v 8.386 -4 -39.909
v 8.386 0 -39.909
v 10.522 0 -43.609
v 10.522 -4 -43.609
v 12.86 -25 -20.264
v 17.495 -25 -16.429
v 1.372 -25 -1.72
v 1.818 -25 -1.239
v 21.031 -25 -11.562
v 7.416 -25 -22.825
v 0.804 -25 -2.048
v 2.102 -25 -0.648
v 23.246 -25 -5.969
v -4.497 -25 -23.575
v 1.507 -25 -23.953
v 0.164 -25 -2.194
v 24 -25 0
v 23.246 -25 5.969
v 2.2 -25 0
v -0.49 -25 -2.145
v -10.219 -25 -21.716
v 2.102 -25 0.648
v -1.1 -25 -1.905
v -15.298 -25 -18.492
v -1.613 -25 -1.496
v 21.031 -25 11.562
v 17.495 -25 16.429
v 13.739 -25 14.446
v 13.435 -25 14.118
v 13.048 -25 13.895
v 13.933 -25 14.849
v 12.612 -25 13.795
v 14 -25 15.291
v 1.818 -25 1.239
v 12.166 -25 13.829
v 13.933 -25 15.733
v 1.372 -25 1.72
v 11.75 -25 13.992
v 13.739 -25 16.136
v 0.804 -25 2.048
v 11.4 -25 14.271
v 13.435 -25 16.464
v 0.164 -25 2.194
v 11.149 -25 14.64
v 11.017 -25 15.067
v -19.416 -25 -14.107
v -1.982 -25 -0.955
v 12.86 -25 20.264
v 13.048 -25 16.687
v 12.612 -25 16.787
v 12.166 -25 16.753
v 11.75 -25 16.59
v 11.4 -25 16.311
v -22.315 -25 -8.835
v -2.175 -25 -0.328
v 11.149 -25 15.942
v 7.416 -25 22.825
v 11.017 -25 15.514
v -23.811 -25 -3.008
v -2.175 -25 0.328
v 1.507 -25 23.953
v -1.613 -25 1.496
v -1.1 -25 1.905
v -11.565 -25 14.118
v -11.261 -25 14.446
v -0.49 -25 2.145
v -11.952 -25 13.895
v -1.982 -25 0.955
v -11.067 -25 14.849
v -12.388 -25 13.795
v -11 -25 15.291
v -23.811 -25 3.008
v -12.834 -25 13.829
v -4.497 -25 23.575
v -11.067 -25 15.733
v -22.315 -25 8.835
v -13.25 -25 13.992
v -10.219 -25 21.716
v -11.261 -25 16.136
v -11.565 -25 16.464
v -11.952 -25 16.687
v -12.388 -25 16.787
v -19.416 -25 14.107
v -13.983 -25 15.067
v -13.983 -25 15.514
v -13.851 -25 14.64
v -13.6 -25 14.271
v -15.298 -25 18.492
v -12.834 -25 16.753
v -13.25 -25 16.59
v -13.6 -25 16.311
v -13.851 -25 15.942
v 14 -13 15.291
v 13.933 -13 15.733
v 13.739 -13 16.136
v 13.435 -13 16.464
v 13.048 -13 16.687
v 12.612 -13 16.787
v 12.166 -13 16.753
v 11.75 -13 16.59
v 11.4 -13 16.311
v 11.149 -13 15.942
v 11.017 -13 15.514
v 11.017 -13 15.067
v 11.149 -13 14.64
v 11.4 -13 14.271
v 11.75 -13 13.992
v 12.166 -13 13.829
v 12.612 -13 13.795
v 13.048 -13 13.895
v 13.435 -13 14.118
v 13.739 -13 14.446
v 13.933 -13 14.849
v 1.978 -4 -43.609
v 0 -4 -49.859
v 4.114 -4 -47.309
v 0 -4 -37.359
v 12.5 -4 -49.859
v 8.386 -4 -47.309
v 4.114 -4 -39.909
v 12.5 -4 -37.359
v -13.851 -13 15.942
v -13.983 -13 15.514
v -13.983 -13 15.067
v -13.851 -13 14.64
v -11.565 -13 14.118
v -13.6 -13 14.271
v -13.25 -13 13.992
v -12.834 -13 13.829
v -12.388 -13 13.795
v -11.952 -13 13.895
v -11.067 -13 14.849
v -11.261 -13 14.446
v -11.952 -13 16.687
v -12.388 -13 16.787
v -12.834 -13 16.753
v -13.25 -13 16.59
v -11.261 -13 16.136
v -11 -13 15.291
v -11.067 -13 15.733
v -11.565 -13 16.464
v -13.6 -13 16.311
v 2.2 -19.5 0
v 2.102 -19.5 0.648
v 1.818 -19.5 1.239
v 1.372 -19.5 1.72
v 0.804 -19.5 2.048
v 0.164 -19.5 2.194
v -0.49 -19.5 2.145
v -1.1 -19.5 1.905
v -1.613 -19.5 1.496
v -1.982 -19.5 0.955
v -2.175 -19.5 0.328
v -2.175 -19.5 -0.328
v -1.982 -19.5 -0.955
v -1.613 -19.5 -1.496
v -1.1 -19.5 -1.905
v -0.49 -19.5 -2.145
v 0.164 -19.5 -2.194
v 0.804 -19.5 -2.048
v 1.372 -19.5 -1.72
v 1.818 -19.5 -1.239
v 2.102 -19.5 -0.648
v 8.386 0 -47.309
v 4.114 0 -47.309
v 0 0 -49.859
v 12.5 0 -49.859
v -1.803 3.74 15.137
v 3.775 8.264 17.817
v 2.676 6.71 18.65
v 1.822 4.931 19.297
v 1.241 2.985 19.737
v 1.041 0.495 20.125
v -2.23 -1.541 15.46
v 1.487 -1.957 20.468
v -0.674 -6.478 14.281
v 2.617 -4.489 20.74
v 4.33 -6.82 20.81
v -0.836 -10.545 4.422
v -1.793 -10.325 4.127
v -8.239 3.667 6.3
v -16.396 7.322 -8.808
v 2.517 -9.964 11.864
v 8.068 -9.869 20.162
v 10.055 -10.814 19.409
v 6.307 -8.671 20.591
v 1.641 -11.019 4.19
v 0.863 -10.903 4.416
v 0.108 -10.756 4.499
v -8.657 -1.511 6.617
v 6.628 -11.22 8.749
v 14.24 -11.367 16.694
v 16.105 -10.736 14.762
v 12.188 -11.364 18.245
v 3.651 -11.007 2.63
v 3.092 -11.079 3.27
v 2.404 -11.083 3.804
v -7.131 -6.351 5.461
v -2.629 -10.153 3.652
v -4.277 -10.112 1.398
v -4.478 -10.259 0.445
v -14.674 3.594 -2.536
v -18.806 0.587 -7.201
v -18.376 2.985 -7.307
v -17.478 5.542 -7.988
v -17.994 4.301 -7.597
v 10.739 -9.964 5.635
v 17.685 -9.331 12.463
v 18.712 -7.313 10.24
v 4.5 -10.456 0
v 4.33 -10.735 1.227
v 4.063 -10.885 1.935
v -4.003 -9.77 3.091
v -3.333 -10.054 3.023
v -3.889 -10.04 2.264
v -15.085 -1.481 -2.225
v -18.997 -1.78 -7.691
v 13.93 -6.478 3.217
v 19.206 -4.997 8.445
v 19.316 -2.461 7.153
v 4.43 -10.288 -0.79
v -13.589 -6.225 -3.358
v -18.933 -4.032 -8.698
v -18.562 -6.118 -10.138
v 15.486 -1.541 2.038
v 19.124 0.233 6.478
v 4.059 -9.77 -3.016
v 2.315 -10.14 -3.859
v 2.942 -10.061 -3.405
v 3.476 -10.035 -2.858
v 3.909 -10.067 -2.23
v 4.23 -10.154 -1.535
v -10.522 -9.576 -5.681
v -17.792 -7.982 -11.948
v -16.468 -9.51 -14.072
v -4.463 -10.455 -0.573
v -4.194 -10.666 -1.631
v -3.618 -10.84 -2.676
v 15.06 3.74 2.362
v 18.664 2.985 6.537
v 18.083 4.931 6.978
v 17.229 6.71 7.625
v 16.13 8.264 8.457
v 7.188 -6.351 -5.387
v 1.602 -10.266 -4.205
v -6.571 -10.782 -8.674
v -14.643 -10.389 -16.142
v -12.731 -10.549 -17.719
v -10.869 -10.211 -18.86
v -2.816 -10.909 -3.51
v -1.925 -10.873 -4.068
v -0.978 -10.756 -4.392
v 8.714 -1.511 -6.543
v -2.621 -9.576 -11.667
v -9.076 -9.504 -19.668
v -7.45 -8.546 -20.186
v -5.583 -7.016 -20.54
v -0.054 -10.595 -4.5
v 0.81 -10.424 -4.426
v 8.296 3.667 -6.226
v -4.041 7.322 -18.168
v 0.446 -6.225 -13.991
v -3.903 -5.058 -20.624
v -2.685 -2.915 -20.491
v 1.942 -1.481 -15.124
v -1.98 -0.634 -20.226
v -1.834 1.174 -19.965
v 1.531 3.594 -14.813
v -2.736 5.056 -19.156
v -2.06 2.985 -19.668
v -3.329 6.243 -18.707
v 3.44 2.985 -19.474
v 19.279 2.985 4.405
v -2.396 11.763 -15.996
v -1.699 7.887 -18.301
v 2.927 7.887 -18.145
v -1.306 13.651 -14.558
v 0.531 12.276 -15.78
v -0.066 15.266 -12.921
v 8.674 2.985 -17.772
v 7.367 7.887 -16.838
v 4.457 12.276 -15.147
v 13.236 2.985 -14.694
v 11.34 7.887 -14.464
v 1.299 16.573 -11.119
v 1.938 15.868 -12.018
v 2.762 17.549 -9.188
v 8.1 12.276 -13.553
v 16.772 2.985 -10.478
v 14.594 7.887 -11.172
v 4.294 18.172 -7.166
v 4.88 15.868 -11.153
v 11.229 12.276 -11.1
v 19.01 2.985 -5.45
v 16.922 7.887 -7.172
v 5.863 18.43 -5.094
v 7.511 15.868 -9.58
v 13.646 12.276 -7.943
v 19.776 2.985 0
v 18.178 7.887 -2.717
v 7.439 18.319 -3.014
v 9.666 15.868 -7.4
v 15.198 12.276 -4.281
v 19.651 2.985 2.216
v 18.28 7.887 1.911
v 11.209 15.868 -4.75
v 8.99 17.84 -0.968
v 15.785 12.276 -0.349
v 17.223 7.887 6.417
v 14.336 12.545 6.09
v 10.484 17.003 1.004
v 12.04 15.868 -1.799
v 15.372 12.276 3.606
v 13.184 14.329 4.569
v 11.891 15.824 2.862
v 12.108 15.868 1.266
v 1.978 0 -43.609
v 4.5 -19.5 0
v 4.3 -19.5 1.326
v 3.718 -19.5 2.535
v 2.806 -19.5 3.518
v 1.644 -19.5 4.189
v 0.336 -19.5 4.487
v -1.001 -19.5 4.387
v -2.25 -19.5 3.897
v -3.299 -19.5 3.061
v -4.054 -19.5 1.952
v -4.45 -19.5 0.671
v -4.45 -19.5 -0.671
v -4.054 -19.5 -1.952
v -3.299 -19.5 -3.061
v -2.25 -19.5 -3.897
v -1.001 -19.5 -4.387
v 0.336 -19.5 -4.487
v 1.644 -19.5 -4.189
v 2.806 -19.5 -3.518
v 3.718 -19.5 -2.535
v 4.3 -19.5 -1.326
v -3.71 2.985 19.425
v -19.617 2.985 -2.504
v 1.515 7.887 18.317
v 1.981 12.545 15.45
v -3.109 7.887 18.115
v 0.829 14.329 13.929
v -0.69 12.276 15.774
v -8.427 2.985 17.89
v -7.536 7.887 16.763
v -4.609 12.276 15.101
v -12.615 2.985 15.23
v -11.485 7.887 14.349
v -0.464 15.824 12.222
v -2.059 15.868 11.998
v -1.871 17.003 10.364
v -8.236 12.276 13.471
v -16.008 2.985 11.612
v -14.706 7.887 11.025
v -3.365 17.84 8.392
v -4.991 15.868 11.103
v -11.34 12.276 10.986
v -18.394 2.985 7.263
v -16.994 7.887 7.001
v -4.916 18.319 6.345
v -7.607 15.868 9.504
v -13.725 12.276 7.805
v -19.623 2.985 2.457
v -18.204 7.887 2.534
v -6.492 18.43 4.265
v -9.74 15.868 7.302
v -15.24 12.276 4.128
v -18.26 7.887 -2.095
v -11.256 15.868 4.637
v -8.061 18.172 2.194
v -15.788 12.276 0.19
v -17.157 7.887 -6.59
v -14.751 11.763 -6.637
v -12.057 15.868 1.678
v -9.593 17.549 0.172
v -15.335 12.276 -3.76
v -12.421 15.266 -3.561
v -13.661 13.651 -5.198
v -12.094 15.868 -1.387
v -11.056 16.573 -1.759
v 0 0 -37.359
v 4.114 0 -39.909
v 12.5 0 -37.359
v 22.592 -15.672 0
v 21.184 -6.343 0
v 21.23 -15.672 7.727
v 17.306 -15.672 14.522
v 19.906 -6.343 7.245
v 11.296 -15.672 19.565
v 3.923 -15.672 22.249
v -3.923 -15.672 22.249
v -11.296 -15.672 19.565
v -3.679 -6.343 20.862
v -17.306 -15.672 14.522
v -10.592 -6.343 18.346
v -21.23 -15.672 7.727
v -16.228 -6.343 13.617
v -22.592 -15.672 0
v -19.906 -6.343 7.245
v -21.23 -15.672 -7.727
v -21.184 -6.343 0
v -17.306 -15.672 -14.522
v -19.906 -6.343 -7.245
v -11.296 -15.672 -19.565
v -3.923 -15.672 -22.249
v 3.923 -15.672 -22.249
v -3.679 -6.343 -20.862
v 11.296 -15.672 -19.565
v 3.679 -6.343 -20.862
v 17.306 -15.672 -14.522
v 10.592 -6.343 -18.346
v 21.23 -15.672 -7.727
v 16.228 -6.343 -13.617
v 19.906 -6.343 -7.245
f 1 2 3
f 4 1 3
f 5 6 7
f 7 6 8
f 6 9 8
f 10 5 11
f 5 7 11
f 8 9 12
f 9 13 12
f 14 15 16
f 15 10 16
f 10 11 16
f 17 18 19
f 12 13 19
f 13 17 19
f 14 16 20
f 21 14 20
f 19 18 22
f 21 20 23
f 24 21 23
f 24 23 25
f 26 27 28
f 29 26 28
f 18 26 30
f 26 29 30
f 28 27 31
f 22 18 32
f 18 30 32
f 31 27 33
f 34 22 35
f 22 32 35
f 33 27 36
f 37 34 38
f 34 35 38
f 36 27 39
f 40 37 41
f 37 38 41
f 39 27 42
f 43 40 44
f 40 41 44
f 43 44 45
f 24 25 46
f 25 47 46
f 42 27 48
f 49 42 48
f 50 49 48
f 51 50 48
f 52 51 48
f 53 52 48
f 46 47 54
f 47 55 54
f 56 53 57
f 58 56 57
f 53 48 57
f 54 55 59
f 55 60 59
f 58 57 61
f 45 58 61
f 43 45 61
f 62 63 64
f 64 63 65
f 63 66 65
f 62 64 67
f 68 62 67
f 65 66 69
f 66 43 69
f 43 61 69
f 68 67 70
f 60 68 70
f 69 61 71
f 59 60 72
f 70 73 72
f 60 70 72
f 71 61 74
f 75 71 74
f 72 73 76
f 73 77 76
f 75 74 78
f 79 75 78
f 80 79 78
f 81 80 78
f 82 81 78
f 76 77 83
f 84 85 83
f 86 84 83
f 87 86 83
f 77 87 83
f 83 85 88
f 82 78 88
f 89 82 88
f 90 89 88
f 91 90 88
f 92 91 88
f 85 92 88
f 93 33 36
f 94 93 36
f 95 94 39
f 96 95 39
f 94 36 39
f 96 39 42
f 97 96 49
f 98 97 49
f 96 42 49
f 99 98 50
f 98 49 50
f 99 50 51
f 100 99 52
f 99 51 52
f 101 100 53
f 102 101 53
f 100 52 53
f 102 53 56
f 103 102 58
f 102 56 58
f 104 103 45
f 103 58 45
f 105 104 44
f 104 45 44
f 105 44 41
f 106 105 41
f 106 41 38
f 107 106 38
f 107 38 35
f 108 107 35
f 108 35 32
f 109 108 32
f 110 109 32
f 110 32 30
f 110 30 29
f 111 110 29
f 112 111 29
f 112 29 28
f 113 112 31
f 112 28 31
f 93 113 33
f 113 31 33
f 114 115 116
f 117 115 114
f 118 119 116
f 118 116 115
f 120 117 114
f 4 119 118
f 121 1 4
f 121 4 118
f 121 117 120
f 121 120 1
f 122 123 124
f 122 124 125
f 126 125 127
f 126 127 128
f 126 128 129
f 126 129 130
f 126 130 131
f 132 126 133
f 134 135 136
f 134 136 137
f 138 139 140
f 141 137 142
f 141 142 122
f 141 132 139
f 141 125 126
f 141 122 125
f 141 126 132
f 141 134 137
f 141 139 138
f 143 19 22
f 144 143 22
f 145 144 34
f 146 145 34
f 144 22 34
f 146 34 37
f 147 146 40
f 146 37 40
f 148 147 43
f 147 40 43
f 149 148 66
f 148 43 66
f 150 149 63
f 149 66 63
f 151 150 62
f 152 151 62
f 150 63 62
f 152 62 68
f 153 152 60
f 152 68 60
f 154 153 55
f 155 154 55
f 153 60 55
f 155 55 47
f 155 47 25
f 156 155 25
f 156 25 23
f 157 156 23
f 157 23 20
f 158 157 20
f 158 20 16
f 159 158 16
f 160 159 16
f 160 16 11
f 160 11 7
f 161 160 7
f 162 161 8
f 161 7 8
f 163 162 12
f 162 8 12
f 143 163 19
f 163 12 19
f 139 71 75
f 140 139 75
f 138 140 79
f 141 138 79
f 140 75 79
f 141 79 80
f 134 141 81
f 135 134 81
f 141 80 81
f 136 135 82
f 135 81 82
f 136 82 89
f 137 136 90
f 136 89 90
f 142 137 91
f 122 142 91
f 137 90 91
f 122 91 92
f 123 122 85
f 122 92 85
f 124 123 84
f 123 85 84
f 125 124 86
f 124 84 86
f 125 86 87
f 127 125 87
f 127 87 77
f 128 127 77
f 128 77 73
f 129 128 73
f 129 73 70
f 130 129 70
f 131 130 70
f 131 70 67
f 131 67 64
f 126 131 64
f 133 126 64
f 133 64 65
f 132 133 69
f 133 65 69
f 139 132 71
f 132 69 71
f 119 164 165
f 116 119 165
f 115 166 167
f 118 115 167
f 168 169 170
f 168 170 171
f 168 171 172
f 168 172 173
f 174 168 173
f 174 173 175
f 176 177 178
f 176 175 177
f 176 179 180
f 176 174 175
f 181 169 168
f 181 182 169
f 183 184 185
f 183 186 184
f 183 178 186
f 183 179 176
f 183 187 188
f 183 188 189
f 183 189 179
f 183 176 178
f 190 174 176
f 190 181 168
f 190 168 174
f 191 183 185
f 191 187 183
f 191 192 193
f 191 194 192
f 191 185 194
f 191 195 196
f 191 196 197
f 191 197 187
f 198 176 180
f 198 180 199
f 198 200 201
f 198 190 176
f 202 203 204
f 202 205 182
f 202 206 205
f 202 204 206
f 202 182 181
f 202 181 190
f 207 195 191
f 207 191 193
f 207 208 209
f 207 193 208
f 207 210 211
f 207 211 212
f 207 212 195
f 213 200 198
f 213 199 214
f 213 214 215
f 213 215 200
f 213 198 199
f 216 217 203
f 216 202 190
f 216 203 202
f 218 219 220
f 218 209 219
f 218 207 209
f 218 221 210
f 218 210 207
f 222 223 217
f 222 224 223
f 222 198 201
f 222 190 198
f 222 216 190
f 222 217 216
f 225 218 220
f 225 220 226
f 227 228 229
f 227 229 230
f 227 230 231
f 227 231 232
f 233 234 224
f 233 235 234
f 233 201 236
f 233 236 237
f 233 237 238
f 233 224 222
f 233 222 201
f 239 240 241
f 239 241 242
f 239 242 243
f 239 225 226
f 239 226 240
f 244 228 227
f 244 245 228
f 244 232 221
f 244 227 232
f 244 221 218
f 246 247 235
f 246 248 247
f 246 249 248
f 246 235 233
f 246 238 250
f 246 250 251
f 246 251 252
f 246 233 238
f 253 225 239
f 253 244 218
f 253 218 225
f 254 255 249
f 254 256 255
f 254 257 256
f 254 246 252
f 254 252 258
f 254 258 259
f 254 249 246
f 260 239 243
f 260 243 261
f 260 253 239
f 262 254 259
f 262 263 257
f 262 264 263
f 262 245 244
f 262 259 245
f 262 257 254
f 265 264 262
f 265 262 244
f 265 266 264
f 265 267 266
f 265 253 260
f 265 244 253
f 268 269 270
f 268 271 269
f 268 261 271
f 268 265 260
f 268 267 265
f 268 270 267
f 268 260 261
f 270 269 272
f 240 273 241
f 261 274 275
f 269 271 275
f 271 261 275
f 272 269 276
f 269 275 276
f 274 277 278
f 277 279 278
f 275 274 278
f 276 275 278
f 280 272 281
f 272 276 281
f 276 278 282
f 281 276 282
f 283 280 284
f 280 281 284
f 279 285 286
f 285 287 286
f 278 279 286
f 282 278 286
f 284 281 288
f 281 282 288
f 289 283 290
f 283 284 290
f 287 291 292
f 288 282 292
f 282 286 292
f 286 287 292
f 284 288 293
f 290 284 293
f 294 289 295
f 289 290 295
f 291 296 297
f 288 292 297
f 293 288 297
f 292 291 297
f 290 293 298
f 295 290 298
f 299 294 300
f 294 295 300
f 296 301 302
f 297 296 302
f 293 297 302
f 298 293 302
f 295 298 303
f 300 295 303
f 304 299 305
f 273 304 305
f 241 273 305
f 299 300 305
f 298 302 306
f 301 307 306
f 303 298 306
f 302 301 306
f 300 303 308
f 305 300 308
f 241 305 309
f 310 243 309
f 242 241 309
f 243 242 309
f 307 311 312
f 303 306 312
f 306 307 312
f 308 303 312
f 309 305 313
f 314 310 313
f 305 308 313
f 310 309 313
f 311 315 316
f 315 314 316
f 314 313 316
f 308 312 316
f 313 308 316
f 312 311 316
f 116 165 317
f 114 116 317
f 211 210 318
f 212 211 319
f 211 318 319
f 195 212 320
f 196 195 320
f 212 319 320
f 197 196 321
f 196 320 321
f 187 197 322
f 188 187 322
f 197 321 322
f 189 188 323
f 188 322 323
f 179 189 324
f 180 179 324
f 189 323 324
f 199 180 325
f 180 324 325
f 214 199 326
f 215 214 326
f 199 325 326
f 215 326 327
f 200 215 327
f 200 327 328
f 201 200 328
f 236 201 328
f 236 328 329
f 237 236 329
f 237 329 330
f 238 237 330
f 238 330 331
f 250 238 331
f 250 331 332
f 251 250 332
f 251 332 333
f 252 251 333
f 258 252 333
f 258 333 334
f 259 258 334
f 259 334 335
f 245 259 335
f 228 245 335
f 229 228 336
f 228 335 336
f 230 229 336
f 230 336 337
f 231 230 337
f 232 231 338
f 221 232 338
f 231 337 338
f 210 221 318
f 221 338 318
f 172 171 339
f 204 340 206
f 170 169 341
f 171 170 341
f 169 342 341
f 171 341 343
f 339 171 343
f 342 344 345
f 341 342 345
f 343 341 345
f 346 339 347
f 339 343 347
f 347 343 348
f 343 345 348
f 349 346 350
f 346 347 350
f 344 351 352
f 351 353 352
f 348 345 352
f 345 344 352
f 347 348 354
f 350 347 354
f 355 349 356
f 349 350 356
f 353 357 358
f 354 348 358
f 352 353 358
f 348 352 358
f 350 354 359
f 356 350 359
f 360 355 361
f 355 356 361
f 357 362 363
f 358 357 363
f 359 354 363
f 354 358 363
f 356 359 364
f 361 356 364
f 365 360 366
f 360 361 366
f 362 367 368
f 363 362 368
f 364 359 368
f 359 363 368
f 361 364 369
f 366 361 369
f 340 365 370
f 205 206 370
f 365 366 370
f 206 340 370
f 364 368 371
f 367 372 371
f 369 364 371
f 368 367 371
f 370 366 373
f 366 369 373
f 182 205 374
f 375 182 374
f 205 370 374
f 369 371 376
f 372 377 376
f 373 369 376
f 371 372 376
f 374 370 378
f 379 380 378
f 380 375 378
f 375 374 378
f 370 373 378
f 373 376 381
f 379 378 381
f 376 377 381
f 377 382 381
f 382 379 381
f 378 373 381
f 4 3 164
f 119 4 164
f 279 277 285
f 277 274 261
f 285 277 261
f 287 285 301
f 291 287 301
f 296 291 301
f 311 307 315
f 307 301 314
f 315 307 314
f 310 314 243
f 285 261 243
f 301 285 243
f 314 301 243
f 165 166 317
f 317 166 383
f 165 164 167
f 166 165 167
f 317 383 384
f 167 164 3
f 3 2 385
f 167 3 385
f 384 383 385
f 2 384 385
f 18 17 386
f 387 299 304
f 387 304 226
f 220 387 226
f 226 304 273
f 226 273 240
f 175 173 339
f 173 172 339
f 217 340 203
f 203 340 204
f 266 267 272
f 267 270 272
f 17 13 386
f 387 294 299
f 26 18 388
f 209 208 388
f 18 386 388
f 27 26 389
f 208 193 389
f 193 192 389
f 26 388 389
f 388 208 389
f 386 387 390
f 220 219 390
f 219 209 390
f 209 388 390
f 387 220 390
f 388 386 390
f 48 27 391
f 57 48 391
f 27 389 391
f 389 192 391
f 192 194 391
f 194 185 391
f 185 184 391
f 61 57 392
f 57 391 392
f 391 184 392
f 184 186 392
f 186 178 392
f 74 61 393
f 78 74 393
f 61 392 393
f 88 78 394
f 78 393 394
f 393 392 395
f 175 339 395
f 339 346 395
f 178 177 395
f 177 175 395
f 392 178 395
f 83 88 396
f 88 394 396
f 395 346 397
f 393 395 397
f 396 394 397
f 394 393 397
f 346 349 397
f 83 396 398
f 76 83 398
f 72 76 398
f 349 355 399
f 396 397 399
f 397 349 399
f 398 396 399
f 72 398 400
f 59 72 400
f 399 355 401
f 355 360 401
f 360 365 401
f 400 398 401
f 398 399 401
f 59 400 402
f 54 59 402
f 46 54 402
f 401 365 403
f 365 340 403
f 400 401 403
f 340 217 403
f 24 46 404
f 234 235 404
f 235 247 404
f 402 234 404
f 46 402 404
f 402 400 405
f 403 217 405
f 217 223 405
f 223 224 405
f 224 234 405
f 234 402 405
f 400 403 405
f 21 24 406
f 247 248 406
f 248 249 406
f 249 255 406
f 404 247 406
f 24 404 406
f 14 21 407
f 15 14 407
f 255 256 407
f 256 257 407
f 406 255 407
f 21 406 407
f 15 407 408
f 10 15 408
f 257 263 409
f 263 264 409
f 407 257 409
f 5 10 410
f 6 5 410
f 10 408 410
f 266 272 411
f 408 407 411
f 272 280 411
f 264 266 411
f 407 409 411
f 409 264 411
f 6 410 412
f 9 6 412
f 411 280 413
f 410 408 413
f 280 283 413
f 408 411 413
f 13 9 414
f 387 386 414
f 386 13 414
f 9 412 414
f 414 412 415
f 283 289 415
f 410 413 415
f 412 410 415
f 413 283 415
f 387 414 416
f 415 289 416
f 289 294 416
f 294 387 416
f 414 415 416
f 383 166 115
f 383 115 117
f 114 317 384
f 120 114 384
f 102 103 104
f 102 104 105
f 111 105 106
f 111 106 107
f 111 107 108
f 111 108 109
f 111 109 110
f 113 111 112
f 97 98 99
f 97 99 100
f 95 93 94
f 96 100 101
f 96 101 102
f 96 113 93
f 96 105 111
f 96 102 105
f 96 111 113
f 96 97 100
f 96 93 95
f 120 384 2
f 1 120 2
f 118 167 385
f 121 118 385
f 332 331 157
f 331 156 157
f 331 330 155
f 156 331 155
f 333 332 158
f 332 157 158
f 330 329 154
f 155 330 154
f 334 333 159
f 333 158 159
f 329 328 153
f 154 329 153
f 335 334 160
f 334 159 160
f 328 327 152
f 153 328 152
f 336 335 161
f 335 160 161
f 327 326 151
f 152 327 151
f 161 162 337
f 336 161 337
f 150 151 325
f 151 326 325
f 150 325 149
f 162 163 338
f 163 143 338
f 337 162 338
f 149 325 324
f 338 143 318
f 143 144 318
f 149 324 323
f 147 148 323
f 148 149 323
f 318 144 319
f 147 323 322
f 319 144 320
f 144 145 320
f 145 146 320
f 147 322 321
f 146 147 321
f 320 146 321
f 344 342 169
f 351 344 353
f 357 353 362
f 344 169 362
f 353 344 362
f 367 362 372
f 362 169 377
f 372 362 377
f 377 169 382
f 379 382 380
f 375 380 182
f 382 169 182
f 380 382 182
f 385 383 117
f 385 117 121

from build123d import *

# Parameters (mm, degrees)
F3_DEPTH  = 25
F7_R      = 2.2
F8_DEPTH  = 5.5
F9_R      = 4.5
F10_DEPTH = 37.9383941675
F11_W     = 12.5
F11_H     = 12.5
F12_DEPTH = 4
F13_R     = 1.5
F14_DEPTH = 12


with BuildPart() as f1:
    # F0 (on Front) → F1 (revolve)
    with BuildSketch(Plane.XZ):
        Polygon((-23.4659114849, -13.5867949931), (-15.0964447363, -19.9273017823), (15.0964447363, 19.9273017823), (5.9298859165, 26.871666361), align=None)
    revolve(axis=Axis((0, 0, 0), (0.6038577895, 0, 0.7970920713)))

    # F2 (on Front) → F3 (join)
    with BuildSketch(Plane.XZ):
        Polygon((-8.9189811838, -24.6071996506), (21.2739082888, 15.2474039141), (8.9189811838, 24.6071996506), (-21.2739082888, -15.2474039141), align=None)
    extrude(amount=-F3_DEPTH)


with BuildPart() as f5:
    # F4 (on Top) → F5 (revolve)
    with BuildSketch(Plane.XY):
        with BuildLine():
            Line((0, 20), (0, -25))
            Line((0, -25), (24, -25))
            Line((24, -25), (19.7759964181, 2.9849565613))
            ThreePointArc((19.7759964181, 2.9849565613), (13.0441724301, 15.160790402), (0, 20))
        make_face()
    revolve(axis=Axis((0, -2.5, 0), (0, -1, 0)))

    # F6: cut F1
    add(f1.part, mode=Mode.SUBTRACT)

    # F7 (on face) → F8 (cut)
    with BuildSketch(Plane.XZ.offset(25)):
        Circle(F7_R)
    extrude(amount=-F8_DEPTH, mode=Mode.SUBTRACT)

    # F9 (on face) → F10 (cut, through all)
    with BuildSketch(Plane.XZ.offset(19.5)):
        Circle(F9_R)
    extrude(amount=-F10_DEPTH, mode=Mode.SUBTRACT)

    # F13 (on face) → F14 (cut)
    with BuildSketch(Plane.XZ.offset(25)):
        with Locations((-12.5, 15.2909286834)):
            Circle(F13_R)
        with Locations((12.5, 15.2909286834)):
            Circle(F13_R)
    extrude(amount=-F14_DEPTH, mode=Mode.SUBTRACT)


with BuildPart() as f12:
    # F11 (on Front) → F12 (new body)
    with BuildSketch(Plane.XZ):
        with Locations((6.25, -43.6086319515)):
            Rectangle(F11_W, F11_H)
        Polygon((1.977608008, -43.6086319515), (4.113804004, -39.9086319515), (8.386195996, -39.9086319515), (10.522391992, -43.6086319515), (8.386195996, -47.3086319515), (4.113804004, -47.3086319515), align=None, mode=Mode.SUBTRACT)
    extrude(amount=F12_DEPTH)


solid = Compound([f5.part, f12.part])
